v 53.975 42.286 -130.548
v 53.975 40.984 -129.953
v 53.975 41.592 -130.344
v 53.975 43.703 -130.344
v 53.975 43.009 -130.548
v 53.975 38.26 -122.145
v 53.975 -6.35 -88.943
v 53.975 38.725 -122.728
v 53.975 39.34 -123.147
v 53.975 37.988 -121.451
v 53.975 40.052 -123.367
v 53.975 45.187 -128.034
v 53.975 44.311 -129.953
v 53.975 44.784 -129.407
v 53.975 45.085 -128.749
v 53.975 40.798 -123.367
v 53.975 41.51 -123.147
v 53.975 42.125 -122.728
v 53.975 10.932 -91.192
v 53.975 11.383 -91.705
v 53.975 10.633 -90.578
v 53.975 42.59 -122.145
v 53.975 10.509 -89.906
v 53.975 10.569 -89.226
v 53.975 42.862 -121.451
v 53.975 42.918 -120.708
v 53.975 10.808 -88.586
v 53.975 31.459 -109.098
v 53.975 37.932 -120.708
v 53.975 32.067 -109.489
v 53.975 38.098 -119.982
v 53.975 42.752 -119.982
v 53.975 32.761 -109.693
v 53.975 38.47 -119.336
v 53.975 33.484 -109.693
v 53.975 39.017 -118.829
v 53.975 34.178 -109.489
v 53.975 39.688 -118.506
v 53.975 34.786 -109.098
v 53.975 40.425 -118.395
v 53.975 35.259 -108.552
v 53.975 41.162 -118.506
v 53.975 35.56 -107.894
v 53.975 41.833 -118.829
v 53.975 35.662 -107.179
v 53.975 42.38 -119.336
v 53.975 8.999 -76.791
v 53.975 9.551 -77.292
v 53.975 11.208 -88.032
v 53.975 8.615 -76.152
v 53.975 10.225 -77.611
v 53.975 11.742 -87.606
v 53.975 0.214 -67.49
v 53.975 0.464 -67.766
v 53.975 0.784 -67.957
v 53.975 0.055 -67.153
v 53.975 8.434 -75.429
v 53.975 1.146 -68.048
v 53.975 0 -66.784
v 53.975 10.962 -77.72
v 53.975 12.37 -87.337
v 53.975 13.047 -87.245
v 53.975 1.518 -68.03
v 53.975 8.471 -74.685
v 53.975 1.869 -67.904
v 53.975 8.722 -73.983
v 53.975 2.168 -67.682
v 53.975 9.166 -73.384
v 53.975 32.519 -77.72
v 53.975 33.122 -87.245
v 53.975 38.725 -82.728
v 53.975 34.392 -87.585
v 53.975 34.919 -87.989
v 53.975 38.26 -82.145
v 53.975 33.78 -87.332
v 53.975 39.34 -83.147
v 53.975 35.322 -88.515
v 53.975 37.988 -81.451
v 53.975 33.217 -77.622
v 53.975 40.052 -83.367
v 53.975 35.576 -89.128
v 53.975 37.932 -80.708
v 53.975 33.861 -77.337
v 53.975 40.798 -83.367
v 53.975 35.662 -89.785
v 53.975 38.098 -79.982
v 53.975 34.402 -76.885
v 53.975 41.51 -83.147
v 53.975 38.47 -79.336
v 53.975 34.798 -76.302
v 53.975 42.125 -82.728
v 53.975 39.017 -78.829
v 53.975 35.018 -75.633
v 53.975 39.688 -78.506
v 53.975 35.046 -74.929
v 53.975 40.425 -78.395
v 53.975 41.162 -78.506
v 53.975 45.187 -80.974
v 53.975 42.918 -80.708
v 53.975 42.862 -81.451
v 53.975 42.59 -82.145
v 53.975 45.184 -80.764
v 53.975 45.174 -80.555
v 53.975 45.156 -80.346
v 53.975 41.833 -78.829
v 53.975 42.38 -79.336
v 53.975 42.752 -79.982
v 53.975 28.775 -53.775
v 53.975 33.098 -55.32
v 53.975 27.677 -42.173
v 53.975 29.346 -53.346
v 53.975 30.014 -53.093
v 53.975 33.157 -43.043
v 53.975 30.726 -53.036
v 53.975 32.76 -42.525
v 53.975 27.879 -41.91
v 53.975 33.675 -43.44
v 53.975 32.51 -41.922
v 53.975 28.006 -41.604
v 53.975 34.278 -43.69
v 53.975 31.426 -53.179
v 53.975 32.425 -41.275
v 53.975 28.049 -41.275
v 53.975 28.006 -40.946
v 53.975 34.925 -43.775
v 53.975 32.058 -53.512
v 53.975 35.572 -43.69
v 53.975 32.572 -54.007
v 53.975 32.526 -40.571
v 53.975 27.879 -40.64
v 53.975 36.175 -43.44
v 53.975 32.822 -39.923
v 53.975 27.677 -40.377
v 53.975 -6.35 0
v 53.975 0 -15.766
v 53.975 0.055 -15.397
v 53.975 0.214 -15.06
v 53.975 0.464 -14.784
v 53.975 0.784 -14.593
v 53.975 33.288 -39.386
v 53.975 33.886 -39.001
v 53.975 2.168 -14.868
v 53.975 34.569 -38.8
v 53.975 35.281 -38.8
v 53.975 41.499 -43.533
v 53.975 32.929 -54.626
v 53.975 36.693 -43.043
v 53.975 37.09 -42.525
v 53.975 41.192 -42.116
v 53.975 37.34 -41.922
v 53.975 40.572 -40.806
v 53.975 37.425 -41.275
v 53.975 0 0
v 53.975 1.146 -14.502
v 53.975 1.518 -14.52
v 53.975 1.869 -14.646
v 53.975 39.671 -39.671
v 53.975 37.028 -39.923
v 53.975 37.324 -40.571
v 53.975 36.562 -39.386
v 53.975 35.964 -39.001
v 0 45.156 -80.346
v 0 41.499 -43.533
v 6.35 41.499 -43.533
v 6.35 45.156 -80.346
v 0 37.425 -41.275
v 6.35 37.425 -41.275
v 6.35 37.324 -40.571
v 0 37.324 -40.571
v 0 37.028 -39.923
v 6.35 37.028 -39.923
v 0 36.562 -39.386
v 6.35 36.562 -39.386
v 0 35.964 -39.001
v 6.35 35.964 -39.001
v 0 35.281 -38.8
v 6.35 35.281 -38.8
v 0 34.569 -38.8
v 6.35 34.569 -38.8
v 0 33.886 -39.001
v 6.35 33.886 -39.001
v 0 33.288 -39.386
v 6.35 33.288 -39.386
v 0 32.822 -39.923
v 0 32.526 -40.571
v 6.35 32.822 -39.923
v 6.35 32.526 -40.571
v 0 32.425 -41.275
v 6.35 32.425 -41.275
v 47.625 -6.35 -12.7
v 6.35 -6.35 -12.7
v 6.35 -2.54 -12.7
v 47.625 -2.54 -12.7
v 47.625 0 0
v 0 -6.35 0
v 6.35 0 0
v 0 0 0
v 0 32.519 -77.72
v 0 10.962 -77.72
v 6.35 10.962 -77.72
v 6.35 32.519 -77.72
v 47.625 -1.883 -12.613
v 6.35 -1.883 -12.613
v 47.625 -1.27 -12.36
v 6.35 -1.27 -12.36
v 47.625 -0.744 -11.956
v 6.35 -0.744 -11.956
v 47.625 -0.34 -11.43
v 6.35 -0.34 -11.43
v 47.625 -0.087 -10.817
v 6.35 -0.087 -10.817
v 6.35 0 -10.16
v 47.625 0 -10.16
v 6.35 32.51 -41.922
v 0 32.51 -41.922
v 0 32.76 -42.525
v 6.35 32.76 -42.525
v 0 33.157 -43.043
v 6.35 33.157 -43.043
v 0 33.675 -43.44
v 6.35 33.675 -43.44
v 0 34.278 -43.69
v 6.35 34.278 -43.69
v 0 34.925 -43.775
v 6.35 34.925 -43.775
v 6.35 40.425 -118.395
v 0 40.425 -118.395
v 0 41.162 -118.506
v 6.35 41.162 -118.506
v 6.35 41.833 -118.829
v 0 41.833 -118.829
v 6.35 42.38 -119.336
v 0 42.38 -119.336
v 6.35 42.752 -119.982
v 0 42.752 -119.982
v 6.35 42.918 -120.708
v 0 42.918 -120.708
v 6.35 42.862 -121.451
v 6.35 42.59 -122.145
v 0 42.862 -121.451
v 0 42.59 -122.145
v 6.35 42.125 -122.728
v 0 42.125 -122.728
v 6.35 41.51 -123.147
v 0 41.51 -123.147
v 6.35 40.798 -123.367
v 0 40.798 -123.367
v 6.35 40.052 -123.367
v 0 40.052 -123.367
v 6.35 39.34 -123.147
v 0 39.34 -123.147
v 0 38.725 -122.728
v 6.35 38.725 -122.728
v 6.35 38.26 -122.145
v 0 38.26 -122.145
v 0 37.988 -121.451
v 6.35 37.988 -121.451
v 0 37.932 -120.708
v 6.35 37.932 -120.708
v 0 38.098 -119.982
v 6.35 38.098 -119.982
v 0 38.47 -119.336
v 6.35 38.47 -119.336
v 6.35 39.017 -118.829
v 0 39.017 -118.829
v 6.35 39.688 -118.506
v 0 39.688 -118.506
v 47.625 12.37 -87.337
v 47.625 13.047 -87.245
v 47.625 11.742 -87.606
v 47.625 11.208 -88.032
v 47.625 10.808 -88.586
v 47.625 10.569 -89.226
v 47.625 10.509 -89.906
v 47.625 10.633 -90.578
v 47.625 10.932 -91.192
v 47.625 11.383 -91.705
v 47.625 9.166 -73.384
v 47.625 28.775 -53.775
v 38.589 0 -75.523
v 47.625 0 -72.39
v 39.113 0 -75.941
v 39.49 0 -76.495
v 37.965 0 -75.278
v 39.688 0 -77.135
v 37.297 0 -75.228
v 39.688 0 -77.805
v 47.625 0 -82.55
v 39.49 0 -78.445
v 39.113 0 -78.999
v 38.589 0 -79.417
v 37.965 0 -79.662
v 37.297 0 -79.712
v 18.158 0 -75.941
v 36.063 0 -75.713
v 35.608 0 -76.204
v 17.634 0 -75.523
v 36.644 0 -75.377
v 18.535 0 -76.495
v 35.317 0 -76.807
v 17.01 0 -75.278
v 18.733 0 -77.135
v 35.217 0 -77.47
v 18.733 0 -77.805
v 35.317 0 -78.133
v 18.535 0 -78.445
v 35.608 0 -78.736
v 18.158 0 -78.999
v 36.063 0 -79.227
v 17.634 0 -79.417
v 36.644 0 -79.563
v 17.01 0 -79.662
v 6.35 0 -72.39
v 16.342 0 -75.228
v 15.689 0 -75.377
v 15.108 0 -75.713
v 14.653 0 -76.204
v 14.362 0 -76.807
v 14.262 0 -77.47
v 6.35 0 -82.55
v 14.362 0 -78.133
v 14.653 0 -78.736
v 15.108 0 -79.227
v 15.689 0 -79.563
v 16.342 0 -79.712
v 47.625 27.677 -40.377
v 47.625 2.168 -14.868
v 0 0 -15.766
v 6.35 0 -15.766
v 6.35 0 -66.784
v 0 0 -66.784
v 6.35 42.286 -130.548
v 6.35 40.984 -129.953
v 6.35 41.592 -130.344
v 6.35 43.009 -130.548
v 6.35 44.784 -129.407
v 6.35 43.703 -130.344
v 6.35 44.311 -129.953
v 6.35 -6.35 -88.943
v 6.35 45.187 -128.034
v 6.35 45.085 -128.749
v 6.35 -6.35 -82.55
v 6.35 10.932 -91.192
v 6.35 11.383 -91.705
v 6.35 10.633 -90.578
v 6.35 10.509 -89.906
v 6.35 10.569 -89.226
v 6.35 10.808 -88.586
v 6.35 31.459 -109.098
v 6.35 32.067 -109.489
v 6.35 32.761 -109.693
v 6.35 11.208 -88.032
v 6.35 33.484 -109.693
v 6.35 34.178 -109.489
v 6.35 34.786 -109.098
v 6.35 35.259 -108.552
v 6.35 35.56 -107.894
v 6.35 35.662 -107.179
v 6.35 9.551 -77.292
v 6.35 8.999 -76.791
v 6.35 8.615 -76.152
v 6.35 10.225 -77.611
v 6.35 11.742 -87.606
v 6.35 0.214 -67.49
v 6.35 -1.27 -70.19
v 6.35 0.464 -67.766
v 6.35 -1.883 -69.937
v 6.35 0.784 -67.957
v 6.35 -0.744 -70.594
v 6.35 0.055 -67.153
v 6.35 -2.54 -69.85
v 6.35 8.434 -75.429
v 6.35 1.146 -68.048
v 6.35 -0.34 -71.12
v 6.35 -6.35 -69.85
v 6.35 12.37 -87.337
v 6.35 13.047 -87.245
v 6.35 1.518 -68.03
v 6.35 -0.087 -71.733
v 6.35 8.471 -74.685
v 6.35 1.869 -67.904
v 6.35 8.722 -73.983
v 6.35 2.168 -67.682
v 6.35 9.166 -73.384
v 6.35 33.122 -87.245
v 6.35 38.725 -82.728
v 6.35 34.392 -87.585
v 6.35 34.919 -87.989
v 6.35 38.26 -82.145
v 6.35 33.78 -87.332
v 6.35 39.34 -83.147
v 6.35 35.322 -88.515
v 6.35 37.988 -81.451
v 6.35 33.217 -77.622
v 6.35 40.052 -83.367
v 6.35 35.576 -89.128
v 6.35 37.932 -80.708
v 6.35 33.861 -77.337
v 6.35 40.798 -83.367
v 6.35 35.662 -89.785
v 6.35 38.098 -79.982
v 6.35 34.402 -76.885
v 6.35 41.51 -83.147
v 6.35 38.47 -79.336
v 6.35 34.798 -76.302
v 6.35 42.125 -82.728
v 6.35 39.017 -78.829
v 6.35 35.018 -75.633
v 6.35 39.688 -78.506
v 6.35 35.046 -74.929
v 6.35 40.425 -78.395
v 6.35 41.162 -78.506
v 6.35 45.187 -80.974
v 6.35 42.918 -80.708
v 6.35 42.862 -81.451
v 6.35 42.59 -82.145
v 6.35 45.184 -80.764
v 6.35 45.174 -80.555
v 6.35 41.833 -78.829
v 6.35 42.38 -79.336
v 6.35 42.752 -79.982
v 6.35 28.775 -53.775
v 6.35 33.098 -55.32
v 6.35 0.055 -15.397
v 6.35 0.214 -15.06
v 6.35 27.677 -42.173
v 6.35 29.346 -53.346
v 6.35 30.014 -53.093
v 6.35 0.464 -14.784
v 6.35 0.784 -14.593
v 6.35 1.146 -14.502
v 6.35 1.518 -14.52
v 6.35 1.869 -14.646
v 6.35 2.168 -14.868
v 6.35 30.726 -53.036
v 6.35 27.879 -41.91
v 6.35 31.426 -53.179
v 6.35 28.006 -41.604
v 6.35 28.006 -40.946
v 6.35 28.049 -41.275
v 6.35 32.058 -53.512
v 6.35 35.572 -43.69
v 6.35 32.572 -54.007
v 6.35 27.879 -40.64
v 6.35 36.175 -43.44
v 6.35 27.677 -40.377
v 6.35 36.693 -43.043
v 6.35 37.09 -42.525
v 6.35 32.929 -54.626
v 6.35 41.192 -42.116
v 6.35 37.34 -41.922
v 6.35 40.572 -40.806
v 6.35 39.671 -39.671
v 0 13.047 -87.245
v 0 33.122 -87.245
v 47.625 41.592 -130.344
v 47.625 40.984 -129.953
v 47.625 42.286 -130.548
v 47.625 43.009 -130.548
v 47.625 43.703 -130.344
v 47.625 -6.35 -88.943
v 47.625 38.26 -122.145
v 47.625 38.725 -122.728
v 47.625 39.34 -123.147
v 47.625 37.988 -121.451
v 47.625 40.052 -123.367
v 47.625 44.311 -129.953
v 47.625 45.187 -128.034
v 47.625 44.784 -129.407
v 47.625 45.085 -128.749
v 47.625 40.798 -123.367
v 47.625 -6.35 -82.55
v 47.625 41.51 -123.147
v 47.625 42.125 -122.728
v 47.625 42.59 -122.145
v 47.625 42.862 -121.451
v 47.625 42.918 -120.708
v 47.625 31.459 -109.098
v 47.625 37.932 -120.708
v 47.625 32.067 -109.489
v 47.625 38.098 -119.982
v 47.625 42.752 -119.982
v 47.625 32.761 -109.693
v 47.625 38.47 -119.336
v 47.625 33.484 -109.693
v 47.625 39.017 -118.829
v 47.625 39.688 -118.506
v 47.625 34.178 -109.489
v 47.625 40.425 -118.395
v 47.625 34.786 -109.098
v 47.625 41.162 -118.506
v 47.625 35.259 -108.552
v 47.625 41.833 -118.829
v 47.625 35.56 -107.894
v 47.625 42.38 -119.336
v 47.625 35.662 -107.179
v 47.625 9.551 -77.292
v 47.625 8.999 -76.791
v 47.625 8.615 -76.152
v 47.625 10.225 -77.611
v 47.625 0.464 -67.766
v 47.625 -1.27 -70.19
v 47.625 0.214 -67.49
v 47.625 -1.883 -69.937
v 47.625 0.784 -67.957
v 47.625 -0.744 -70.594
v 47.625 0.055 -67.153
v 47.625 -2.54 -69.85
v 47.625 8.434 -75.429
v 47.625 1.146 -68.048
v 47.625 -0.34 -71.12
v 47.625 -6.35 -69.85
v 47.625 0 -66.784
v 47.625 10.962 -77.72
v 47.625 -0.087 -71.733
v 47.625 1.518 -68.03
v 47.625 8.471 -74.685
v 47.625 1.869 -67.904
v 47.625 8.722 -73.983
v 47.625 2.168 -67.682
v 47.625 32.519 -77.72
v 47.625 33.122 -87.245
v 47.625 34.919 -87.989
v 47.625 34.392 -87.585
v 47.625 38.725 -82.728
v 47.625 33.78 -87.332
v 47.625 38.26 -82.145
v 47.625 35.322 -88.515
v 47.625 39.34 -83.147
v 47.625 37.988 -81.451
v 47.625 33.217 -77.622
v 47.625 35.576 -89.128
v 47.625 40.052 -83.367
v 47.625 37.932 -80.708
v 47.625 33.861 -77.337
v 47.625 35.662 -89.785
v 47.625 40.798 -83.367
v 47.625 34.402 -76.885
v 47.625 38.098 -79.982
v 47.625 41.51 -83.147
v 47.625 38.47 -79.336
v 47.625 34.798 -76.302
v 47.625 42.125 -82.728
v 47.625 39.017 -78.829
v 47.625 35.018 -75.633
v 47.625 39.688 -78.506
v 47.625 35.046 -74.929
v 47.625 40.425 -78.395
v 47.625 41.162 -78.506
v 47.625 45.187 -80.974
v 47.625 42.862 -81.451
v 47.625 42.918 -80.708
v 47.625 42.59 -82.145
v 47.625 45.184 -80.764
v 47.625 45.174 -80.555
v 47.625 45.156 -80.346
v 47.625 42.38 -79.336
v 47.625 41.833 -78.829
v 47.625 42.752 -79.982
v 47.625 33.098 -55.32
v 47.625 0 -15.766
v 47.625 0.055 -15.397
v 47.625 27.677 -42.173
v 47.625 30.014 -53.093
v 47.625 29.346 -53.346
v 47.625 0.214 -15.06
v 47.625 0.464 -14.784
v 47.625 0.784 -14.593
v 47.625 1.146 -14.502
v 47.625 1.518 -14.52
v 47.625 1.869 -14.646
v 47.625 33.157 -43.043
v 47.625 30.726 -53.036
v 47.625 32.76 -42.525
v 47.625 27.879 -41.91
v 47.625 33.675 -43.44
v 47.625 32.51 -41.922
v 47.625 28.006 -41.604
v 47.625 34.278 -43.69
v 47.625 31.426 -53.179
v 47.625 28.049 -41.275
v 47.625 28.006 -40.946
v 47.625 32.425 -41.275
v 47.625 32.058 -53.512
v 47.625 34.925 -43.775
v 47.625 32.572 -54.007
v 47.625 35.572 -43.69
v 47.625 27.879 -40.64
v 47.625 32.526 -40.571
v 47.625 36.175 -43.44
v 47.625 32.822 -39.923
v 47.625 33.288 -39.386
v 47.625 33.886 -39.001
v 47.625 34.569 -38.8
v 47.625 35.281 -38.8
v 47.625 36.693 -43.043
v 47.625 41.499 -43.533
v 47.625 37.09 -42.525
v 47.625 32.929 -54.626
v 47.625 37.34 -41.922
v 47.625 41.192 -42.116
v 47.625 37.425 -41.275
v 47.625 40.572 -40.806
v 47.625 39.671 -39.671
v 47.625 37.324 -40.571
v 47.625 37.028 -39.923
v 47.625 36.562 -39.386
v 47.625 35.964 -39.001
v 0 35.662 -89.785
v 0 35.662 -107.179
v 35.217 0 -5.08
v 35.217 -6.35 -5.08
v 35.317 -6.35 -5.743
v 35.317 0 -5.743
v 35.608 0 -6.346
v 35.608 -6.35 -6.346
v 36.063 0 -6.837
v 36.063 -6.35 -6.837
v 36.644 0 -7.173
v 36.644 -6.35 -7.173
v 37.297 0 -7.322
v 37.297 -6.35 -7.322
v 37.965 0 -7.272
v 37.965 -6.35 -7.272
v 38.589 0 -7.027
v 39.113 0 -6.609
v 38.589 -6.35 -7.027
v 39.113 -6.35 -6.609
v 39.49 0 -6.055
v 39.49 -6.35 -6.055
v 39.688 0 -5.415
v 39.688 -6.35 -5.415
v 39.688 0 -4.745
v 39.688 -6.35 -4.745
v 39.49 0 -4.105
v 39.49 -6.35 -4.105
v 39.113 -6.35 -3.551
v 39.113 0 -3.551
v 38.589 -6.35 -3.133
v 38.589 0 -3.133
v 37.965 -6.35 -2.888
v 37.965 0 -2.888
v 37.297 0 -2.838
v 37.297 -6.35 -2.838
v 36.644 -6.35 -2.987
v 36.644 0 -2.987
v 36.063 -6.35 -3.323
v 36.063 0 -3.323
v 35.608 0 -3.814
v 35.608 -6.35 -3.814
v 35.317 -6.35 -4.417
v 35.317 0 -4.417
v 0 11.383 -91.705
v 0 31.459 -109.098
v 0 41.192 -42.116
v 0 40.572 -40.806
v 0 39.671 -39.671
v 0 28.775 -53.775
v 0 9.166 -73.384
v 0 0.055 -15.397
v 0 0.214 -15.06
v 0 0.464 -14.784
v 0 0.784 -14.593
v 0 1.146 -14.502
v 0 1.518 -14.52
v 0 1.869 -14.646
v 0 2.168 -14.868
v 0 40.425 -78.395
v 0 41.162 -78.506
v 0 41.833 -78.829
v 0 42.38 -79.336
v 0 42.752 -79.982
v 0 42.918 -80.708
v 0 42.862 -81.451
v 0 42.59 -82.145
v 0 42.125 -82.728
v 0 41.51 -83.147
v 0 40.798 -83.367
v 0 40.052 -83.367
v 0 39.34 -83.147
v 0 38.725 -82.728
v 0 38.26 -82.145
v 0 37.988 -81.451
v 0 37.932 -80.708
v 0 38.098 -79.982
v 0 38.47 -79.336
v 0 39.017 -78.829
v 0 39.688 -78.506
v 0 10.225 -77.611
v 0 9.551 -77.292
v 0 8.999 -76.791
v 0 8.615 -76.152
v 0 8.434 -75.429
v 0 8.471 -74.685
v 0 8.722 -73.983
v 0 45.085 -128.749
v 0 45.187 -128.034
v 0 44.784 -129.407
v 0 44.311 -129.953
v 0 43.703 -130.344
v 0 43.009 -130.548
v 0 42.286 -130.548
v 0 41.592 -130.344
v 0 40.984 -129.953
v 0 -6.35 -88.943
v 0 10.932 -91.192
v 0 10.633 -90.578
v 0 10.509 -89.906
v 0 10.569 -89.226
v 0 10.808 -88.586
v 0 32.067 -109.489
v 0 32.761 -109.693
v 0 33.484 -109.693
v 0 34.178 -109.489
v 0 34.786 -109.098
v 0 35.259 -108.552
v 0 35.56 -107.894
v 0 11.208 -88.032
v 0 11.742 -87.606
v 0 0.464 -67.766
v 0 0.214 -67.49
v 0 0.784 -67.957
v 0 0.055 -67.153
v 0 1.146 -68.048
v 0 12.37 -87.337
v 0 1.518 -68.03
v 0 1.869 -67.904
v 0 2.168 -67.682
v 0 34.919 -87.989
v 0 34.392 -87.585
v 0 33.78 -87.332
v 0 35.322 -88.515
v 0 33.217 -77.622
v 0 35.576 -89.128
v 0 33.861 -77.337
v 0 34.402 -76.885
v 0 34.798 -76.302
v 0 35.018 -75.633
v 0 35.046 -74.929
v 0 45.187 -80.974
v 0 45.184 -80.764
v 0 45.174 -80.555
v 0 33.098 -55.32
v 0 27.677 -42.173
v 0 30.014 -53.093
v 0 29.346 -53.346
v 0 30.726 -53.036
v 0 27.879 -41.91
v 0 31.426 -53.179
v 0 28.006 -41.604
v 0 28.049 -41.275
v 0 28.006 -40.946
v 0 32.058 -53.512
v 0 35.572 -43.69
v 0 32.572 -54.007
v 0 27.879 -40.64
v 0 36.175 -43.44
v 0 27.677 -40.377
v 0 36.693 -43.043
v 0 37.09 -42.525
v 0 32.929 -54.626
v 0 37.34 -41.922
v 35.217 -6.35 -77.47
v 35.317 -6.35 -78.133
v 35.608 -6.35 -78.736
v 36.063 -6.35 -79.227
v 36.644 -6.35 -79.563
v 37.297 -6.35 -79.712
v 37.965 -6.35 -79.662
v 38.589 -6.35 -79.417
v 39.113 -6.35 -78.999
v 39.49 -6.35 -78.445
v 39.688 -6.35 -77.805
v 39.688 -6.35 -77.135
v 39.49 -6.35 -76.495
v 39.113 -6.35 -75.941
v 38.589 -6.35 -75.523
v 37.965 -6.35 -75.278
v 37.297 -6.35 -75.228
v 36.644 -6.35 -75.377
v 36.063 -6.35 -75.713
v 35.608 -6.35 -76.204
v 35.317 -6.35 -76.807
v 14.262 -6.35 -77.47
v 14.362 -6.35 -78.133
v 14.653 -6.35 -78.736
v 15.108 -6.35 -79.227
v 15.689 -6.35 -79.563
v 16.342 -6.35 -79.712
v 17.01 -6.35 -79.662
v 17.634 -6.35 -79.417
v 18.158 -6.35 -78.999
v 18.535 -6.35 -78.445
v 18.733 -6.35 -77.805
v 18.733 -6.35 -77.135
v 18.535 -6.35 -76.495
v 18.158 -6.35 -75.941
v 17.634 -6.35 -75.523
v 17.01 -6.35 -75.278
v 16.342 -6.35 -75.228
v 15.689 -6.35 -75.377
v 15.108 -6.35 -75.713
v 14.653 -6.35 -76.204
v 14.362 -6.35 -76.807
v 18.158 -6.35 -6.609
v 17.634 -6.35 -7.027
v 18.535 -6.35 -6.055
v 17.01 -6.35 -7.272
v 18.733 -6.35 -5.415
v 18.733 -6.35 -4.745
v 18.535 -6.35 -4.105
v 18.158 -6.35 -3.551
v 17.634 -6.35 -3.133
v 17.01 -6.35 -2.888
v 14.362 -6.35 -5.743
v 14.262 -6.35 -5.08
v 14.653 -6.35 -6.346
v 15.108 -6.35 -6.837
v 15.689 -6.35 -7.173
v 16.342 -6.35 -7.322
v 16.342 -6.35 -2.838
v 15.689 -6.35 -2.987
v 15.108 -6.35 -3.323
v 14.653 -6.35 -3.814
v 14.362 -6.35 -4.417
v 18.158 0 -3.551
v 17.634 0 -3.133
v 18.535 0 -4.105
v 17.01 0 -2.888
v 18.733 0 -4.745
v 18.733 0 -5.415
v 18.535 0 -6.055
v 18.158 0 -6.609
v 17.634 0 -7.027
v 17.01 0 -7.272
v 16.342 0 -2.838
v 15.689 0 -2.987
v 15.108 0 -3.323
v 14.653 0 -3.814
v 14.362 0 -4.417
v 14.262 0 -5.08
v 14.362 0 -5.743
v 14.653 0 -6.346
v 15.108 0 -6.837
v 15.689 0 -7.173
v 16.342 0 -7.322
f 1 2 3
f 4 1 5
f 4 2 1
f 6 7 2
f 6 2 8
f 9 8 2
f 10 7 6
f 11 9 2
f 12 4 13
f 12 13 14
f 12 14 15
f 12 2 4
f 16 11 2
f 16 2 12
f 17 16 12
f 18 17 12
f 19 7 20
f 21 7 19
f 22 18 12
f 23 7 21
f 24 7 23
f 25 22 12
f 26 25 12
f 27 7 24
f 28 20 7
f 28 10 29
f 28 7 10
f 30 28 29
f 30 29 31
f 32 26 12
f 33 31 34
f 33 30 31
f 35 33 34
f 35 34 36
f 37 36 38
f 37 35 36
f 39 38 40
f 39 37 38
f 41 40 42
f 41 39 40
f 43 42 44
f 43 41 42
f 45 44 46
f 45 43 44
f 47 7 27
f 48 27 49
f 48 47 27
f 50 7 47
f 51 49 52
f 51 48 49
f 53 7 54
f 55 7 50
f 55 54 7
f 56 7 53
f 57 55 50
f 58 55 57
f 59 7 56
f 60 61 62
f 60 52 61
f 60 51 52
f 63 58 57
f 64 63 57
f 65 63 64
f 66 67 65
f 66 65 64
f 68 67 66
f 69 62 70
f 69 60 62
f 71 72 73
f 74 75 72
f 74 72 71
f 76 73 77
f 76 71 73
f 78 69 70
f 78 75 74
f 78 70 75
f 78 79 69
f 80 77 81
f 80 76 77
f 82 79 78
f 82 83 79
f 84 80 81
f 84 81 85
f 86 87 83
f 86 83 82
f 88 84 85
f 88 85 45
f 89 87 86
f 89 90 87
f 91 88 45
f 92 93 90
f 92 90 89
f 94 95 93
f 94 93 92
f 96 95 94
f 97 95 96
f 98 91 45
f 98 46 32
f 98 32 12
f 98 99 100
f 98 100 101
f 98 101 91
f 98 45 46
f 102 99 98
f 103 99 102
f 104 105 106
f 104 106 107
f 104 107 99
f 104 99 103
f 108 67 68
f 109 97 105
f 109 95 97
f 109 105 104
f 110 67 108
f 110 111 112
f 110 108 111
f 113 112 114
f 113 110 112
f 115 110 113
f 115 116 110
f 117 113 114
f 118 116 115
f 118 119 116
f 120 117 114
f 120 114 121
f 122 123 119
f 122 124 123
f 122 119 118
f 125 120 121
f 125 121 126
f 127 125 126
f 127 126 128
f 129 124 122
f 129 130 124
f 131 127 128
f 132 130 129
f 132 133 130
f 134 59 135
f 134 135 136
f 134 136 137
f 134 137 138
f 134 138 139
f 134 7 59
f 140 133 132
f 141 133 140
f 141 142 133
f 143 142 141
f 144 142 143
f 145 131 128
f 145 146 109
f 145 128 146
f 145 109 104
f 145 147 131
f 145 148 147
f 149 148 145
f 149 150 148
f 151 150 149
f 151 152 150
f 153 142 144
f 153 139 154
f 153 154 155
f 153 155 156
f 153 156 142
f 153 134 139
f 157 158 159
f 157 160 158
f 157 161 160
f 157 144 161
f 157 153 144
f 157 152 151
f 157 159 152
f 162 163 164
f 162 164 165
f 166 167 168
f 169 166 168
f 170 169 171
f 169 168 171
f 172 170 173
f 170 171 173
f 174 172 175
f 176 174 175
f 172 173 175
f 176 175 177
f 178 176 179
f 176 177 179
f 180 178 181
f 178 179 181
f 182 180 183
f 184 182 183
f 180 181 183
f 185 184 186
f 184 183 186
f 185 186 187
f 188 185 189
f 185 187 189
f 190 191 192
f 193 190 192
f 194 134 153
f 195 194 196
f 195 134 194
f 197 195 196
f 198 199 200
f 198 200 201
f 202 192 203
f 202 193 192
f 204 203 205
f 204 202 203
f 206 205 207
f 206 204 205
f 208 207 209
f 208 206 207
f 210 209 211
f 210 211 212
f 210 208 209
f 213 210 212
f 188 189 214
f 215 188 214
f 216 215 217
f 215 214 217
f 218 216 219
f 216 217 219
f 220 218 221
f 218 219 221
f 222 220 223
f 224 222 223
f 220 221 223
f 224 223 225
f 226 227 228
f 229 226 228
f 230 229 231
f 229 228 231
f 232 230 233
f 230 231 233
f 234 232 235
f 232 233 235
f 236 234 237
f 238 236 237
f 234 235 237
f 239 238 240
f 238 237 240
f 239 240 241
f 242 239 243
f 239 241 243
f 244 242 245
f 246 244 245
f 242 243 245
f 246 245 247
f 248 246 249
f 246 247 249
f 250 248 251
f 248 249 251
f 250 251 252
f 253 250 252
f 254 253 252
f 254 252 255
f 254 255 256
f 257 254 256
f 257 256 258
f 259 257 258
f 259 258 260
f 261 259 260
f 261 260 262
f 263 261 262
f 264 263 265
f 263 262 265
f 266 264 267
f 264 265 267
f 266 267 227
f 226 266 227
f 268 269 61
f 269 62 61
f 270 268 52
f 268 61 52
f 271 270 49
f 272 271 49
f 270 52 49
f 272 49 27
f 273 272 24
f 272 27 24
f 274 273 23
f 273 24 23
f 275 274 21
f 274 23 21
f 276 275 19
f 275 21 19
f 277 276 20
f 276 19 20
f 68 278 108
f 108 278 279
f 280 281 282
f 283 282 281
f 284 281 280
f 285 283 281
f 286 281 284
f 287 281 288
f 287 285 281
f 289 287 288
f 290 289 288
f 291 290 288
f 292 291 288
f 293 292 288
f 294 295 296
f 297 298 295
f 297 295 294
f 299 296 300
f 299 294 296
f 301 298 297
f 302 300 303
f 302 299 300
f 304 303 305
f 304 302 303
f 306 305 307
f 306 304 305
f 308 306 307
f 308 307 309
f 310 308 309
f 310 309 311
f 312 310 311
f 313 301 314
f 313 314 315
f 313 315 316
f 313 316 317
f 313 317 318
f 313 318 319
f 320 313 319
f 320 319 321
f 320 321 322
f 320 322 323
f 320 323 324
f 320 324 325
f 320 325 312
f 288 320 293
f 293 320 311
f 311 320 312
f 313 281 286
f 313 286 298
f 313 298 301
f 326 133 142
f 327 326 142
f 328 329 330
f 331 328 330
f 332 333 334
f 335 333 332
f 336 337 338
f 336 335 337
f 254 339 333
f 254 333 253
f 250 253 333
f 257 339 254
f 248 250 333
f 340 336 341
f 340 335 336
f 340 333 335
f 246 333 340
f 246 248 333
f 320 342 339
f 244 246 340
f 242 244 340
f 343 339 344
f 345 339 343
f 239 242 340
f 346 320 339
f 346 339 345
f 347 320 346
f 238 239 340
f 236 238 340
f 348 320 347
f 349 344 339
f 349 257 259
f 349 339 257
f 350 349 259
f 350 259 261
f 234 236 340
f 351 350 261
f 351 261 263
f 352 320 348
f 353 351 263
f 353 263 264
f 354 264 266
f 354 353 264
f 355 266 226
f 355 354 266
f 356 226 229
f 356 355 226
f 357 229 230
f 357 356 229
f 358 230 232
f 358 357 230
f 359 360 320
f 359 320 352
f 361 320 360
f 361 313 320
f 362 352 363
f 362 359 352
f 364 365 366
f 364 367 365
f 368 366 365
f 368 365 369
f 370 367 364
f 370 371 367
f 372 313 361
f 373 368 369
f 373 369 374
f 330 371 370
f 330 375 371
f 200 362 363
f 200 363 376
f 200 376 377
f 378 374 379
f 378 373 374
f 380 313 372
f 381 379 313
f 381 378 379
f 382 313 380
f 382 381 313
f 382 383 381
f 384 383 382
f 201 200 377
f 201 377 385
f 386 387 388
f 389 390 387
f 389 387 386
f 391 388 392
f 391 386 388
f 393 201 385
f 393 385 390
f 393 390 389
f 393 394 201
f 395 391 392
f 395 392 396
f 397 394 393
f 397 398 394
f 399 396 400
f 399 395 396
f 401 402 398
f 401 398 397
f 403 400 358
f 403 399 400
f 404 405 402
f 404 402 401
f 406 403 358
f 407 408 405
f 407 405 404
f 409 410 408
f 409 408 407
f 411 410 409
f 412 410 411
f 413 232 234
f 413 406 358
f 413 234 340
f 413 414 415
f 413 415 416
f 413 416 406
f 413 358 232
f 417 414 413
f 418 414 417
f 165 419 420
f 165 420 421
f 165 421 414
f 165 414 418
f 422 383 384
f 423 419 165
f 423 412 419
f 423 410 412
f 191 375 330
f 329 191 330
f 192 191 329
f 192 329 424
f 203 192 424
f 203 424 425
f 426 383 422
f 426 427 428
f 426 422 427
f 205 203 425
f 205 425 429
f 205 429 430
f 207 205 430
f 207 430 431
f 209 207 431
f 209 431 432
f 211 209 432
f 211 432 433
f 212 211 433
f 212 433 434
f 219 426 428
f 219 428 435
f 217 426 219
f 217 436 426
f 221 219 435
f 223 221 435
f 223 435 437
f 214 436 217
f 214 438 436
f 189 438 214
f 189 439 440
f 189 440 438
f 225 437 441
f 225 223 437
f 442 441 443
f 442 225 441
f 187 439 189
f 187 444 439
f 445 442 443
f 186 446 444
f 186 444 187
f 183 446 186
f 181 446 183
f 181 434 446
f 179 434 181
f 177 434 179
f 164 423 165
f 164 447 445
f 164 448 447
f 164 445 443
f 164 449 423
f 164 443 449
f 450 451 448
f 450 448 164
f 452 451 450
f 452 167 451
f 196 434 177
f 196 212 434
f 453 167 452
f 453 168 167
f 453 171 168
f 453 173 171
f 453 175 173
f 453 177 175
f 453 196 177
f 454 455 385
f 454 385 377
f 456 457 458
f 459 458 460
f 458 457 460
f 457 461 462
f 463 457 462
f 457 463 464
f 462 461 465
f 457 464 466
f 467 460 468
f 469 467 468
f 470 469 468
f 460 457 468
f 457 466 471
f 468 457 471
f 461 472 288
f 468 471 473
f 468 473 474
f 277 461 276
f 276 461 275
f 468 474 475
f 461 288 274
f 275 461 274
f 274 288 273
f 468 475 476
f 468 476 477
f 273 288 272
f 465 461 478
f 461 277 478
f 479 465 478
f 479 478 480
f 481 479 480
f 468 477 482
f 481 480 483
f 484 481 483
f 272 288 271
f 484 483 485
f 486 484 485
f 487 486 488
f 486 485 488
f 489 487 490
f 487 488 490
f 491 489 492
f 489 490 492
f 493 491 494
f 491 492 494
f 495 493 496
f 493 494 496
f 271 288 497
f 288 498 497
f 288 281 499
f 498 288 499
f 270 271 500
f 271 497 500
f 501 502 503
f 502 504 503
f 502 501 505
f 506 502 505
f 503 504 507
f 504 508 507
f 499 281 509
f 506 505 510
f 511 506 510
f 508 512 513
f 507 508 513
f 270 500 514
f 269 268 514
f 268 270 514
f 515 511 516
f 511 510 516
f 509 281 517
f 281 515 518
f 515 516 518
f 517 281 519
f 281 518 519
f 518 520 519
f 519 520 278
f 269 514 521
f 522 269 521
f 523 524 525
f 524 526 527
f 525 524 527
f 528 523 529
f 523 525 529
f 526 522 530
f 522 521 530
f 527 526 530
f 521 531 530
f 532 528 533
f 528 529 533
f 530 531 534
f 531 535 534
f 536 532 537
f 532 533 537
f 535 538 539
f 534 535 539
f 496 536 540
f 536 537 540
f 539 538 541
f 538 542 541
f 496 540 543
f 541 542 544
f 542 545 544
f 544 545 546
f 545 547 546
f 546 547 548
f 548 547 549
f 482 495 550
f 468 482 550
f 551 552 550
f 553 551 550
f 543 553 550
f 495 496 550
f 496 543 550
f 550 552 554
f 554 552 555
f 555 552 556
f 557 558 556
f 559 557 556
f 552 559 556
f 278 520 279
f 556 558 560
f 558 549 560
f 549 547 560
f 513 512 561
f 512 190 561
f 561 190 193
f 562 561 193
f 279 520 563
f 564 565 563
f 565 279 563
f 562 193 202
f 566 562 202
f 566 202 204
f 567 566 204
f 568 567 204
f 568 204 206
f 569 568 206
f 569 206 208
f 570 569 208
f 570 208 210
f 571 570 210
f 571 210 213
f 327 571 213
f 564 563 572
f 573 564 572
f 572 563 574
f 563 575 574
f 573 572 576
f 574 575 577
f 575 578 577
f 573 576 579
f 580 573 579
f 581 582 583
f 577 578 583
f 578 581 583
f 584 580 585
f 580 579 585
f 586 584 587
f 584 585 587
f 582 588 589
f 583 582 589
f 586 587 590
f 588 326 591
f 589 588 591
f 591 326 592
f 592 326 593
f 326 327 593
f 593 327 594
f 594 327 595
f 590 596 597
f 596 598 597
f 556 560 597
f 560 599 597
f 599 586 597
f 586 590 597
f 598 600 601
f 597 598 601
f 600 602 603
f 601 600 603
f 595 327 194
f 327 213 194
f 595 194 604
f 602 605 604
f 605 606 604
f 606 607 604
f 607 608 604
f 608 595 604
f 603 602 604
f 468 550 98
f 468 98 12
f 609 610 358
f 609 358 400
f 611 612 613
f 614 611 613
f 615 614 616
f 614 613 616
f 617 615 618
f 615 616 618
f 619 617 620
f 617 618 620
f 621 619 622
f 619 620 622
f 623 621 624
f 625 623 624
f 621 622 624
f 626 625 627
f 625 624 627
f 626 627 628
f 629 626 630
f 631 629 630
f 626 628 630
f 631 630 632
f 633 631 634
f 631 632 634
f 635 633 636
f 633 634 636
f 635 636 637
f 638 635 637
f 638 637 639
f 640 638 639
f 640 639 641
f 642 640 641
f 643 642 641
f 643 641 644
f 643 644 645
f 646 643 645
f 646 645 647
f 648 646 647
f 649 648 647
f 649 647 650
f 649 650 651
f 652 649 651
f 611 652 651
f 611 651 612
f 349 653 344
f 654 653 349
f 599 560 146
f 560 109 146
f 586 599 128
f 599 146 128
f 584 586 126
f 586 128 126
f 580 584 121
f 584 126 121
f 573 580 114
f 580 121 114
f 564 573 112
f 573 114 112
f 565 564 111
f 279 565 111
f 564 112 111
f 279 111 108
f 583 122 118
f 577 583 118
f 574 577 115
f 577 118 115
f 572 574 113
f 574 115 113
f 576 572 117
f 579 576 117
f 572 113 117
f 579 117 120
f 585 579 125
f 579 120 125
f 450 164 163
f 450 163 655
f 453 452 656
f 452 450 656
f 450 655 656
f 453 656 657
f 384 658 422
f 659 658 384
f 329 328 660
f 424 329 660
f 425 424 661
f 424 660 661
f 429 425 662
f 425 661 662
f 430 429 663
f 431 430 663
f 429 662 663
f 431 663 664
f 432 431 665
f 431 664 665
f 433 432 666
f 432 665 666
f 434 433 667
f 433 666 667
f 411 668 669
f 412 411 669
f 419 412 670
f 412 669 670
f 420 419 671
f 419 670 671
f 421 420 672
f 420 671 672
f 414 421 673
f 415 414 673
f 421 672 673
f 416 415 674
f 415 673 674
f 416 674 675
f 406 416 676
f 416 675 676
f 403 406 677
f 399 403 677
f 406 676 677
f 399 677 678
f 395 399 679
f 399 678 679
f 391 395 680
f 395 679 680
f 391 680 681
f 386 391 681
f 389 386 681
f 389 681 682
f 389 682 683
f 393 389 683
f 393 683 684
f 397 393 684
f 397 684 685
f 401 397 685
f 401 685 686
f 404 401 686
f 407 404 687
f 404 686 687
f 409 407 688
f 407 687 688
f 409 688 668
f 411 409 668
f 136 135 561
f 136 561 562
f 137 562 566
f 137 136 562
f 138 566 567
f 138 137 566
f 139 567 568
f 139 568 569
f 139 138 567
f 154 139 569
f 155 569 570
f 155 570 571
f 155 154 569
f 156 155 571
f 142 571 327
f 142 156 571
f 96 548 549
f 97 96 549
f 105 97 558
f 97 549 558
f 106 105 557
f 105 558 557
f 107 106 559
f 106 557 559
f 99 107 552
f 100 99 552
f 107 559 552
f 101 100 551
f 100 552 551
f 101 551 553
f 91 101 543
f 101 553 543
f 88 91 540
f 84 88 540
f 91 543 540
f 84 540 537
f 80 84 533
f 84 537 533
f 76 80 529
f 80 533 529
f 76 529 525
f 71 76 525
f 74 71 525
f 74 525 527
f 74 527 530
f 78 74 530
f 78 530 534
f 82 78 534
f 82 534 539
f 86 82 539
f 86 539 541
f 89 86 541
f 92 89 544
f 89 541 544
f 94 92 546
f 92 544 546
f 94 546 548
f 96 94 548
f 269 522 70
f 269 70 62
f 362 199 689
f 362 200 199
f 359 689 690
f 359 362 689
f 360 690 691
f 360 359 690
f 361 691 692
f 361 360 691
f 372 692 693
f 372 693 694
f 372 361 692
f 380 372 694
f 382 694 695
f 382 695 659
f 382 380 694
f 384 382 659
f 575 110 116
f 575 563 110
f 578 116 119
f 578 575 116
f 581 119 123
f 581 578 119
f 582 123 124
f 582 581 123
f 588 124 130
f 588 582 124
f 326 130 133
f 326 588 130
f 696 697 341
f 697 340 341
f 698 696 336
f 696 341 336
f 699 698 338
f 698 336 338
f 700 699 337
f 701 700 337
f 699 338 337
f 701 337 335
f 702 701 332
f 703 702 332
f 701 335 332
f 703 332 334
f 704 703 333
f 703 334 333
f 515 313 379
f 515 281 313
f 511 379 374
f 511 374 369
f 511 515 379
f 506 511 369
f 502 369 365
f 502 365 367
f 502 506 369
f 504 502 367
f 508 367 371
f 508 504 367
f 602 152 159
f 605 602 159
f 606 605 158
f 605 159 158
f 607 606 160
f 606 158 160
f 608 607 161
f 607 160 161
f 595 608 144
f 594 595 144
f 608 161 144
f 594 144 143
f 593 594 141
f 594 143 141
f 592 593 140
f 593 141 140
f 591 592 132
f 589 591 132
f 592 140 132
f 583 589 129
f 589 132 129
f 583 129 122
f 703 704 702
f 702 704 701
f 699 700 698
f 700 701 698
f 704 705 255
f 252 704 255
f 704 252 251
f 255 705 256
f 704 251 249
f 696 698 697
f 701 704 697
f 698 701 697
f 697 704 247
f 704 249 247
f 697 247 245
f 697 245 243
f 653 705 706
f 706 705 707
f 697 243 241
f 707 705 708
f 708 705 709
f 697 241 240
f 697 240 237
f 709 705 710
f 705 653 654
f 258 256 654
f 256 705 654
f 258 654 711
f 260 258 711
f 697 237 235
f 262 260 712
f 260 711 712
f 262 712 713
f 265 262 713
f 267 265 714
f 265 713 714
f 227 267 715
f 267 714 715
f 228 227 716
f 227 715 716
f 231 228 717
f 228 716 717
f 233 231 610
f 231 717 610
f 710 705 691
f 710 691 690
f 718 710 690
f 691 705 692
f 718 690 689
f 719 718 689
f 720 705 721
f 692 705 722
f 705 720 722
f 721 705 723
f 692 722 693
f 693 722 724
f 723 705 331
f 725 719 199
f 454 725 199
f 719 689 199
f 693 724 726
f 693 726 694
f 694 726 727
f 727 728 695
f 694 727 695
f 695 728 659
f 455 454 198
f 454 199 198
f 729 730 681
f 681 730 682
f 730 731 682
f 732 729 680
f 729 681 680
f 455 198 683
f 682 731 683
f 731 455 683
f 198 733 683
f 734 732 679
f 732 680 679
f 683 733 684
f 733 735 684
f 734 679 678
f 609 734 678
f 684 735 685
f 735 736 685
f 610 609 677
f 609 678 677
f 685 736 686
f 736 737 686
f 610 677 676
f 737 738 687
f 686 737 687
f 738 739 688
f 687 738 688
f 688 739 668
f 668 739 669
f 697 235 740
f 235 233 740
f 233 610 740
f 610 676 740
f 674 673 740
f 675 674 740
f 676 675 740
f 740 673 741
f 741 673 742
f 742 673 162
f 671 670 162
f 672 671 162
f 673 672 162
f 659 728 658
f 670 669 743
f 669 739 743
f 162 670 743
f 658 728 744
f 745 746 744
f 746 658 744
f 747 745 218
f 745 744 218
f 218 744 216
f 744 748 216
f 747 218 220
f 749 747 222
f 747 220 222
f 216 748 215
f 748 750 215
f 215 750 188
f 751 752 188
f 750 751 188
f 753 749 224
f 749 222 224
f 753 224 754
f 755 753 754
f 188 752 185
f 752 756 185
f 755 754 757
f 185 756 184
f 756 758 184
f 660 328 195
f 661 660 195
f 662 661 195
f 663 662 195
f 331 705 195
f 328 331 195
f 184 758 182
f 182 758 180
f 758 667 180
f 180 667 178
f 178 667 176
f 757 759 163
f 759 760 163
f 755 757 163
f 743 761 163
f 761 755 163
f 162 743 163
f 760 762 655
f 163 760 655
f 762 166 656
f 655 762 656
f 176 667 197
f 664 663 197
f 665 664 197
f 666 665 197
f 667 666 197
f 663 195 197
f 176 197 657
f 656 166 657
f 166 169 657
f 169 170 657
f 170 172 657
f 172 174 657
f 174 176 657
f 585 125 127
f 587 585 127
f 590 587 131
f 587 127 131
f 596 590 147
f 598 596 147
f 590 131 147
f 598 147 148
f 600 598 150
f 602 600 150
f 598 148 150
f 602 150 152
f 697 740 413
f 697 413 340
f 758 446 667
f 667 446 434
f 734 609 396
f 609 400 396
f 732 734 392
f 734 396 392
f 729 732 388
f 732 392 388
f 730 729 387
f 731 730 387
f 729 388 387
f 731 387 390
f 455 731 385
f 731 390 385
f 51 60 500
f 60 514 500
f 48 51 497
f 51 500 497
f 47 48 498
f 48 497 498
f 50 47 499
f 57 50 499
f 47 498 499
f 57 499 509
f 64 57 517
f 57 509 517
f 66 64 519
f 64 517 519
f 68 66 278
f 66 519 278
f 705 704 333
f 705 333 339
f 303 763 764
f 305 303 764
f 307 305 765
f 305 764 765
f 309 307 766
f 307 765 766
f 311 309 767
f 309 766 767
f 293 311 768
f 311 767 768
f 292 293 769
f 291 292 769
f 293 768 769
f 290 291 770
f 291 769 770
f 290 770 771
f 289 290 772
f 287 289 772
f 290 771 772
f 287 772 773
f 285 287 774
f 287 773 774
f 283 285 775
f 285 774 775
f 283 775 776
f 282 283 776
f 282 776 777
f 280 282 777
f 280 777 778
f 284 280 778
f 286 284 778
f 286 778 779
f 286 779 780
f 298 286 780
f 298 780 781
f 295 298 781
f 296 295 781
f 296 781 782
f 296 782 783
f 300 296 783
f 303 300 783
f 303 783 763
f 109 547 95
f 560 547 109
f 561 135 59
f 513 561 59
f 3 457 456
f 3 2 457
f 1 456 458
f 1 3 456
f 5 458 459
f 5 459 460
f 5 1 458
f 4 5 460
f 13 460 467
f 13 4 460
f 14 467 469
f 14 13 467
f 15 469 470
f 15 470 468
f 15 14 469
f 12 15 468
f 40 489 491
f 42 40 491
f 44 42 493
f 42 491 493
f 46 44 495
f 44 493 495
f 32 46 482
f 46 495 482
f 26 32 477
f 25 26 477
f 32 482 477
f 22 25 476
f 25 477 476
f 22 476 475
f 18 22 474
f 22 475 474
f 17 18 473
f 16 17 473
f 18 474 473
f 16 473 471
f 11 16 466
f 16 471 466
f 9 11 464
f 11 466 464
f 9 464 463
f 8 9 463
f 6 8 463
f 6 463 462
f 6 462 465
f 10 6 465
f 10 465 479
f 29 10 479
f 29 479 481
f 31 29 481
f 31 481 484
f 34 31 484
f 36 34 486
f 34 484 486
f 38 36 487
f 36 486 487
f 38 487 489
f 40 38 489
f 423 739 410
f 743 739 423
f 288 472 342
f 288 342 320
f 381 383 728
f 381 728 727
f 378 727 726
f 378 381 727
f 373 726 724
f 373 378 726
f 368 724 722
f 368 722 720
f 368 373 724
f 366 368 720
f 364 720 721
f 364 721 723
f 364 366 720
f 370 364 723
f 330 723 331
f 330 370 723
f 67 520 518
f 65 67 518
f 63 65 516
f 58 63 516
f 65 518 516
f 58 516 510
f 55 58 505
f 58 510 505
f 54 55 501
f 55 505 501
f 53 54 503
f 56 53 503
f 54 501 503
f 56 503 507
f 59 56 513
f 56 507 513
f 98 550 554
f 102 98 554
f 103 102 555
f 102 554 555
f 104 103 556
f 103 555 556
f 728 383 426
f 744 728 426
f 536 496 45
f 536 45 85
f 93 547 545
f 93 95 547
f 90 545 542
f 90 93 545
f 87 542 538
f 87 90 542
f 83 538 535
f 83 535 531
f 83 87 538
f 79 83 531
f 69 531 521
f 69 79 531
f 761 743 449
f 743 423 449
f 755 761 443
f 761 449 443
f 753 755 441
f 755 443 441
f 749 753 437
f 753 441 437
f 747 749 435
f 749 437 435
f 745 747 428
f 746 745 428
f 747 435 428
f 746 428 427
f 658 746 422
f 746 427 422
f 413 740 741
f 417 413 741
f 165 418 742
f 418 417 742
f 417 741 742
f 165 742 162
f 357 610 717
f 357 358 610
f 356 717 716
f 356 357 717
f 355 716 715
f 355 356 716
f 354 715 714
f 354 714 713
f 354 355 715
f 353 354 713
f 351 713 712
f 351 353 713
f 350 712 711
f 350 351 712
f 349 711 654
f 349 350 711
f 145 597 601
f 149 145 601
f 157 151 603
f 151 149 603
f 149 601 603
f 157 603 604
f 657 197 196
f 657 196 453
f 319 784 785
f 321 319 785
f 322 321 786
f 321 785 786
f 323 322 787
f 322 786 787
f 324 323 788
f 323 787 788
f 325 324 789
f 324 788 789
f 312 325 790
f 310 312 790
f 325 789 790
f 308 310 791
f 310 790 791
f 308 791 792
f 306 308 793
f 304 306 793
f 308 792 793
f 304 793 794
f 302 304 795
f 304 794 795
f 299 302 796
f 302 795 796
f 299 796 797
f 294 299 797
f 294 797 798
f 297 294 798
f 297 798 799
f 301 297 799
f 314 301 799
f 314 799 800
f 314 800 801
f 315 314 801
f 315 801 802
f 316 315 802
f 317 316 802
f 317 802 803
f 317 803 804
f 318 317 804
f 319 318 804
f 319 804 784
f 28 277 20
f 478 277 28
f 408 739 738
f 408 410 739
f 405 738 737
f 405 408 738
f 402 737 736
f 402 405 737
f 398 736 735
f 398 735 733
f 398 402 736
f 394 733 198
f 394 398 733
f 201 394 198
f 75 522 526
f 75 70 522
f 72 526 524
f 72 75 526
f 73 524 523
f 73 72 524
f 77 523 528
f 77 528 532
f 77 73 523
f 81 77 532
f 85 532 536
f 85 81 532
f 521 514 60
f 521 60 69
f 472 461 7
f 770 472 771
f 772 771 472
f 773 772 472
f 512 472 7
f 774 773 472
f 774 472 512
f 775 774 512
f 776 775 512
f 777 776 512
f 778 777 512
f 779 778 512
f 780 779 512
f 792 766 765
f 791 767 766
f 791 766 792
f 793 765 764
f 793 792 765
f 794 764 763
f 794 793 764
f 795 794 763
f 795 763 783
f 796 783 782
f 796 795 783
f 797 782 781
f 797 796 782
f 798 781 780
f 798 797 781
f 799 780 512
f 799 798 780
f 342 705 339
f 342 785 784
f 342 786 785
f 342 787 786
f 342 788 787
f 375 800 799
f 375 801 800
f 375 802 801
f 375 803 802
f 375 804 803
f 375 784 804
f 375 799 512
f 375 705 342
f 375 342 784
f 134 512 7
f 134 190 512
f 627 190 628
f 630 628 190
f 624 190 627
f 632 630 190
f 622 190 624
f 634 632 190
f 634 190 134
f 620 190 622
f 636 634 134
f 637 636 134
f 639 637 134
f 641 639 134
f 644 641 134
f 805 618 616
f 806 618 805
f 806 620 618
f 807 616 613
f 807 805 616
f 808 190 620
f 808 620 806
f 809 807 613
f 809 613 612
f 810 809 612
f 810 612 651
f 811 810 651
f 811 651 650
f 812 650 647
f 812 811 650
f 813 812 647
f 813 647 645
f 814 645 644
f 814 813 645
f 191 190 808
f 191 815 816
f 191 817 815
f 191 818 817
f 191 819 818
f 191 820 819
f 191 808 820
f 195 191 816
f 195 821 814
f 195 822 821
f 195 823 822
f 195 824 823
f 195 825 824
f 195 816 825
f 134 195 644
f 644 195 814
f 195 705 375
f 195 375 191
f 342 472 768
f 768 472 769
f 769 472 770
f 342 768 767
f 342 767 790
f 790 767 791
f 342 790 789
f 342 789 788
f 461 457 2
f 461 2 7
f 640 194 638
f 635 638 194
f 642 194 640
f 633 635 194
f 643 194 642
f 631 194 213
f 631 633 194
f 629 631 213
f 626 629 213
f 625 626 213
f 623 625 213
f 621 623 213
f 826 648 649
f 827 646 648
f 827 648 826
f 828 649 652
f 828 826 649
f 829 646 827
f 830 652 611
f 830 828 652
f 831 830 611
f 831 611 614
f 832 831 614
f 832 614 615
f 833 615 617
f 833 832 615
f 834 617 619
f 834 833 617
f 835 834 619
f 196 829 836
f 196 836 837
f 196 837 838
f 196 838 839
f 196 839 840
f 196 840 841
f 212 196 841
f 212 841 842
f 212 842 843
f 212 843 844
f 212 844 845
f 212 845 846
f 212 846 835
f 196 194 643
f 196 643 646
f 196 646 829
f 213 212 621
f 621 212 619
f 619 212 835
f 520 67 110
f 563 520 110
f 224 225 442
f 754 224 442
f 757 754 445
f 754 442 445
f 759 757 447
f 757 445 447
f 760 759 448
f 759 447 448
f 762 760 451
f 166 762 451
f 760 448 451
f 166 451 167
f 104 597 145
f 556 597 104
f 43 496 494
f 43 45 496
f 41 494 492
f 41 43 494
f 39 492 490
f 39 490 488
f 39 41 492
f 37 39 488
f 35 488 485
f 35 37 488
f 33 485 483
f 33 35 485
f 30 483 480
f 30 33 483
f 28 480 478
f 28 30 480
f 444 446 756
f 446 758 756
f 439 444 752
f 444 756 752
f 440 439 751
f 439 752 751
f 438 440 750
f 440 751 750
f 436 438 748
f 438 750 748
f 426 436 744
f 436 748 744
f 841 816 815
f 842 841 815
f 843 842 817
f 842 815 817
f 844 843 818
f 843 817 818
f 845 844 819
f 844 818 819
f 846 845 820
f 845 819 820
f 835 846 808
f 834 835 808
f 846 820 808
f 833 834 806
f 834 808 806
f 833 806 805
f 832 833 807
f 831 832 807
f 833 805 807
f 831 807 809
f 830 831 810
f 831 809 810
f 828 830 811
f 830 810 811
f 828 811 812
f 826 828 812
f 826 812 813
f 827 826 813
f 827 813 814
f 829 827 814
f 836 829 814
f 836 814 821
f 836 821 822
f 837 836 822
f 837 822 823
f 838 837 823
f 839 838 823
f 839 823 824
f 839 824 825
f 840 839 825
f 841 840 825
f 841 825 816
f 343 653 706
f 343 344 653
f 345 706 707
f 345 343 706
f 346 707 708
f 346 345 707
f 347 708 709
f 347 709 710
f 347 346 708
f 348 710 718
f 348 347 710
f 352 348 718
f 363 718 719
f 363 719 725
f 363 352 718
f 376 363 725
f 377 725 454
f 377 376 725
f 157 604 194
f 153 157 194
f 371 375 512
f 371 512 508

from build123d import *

# Parameters (mm, degrees)
BOSS_EXTRUDE3_DEPTH   = 6.35
SKETCH13_W            = 12.7
SKETCH13_H            = 6.35
BOSS_EXTRUDE4_DEPTH   = 41.275
SKETCH14_W            = 12.7
SKETCH14_H            = 6.35
SKETCH14_W_2          = 69.85
BOSS_EXTRUDE5_DEPTH   = 6.35
CUT_EXTRUDE4_DEPTH    = 107.917859827
CUT_EXTRUDE5_DEPTH    = 107.917859827
SKETCH26_R            = 2.5
BOSS_EXTRUDE6_DEPTH   = 6.35
BOSS_EXTRUDE7_START   = -47.625
SKETCH26_2_R          = 2.5
BOSS_EXTRUDE7_DEPTH   = 6.35
FILLET17_R            = 1.27
FILLET18_R            = 1.27
FILLET19_R            = 1.27
FILLET20_START        = 47.625
FILLET20_DEPTH        = 6.35
FILLET21_R            = 1.27
FILLET22_DEPTH        = 6.35
FILLET29_R            = 2.54
F_8_CLEARANCE_HOLE1_D = 4.4958
FILLET30_R            = 6.35
FILLET31_R            = 2.54


with BuildPart() as part:
    # Sketch4 → Boss-Extrude3 (new body)
    with BuildSketch(Plane(origin=(0, 0, 0), x_dir=(0, 0, -1), z_dir=(1, 0, 0))):
        Polygon((0, 0), (41.275, 41.275), (82.55, 0), (82.55, -6.35), (0, -6.35), align=None)
    extrude(amount=BOSS_EXTRUDE3_DEPTH)

    # Sketch13 → Boss-Extrude4 (add)
    with BuildSketch(Plane(origin=(6.35, 0, 0), x_dir=(0, 0, -1), z_dir=(1, 0, 0))):
        with Locations((6.35, -3.175)):
            Rectangle(SKETCH13_W, SKETCH13_H)
        with Locations((76.2, -3.175)):
            Rectangle(SKETCH13_W, SKETCH13_H)
    extrude(amount=BOSS_EXTRUDE4_DEPTH)

    # Sketch14 → Boss-Extrude5 (add)
    with BuildSketch(Plane(origin=(47.625, 0, 0), x_dir=(0, 0, -1), z_dir=(1, 0, 0))):
        Polygon((41.275, 41.275), (0, 0), (12.7, 0), (82.55, 0), align=None)
        with Locations((6.35, -3.175)):
            Rectangle(SKETCH14_W, SKETCH14_H)
        with Locations((47.625, -3.175)):
            Rectangle(SKETCH14_W_2, SKETCH14_H)
    extrude(amount=BOSS_EXTRUDE5_DEPTH)

    # Sketch20 → Cut-Extrude4 (cut, through all)
    with BuildSketch(Plane(origin=(53.975, 0, 0), x_dir=(0, 0, -1), z_dir=(1, 0, 0))):
        Polygon((41.275, 28.575), (12.7, 0), (69.85, 0), align=None)
    extrude(amount=-CUT_EXTRUDE4_DEPTH, mode=Mode.SUBTRACT)

    # Sketch21 → Cut-Extrude5 (cut, through all)
    with BuildSketch(Plane(origin=(53.975, 0, 0), x_dir=(0, 0, -1), z_dir=(1, 0, 0))):
        with BuildLine():
            ThreePointArc((43.775, 34.925), (43.042766953, 36.692766953), (41.275, 37.425))
            Line((41.275, 37.425), (41.275, 32.425))
            ThreePointArc((41.275, 32.425), (43.042766953, 33.157233047), (43.775, 34.925))
        make_face()
        with BuildLine():
            Line((41.275, 32.425), (41.275, 37.425))
            ThreePointArc((41.275, 37.425), (38.775, 34.925), (41.275, 32.425))
        make_face()
    extrude(amount=-CUT_EXTRUDE5_DEPTH, mode=Mode.SUBTRACT)

    # Sketch26 → Boss-Extrude6 (add)
    with BuildSketch(Plane.ZY):
        Polygon((-41.275, 41.275), (-80.659092999, 45.187499922), (-133.595070682, 45.187499922), (-88.943397116, -6.35), (-77.720070682, -6.35), (-77.720070682, 35.323646113), (-49.981920931, 32.568079069), align=None)
        with Locations((-80.895070682, 40.424999922)):
            Circle(SKETCH26_R, mode=Mode.SUBTRACT)
        with Locations((-120.895070682, 40.424999922)):
            Circle(SKETCH26_R, mode=Mode.SUBTRACT)
        Polygon((-87.245070682, 35.662499922), (-87.245070682, 6.23593212), (-112.740011292, 35.662499922), align=None, mode=Mode.SUBTRACT)
    extrude(amount=-BOSS_EXTRUDE6_DEPTH)

    # Sketch26<2> → Boss-Extrude7 (add)
    with BuildSketch(Plane.ZY.offset(BOSS_EXTRUDE7_START)):
        Polygon((-41.275, 41.275), (-80.659092999, 45.187499922), (-133.595070682, 45.187499922), (-88.943397116, -6.35), (-77.720070682, -6.35), (-77.720070682, 35.323646113), (-49.981920931, 32.568079069), align=None)
        with Locations((-80.895070682, 40.424999922)):
            Circle(SKETCH26_2_R, mode=Mode.SUBTRACT)
        with Locations((-120.895070682, 40.424999922)):
            Circle(SKETCH26_2_R, mode=Mode.SUBTRACT)
        Polygon((-87.245070682, 35.662499922), (-87.245070682, 6.23593212), (-112.740011292, 35.662499922), align=None, mode=Mode.SUBTRACT)
    extrude(amount=-BOSS_EXTRUDE7_DEPTH)

    # Fillet17
    fillet17_edges = [part.edges().sort_by_distance(p)[0] for p in [
        (3.175, 28.575, -41.275),
    ]]
    fillet(fillet17_edges, radius=FILLET17_R)

    # Fillet18
    fillet18_edges = [part.edges().sort_by_distance(p)[0] for p in [
        (50.8, 28.575, -41.275),
    ]]
    fillet(fillet18_edges, radius=FILLET18_R)

    # Fillet19
    # the kernel refuses this fillet: 1.27 mm, written as the material it adds along each edge
    with BuildSketch(Plane(origin=(53.975, 0, -12.7), x_dir=(0, 0.7071067811865481, -0.7071067811865469), z_dir=(-1, 0, 0))) as fillet19_piece_1:
        with BuildLine():
            CenterArc((FILLET19_R * 2.41421356237, FILLET19_R), FILLET19_R, 135, 135)
            Line((FILLET19_R * 1.70710678119, FILLET19_R * 1.70710678119), (0, 0))
            Line((0, 0), (FILLET19_R * 2.41421356237, 0))
        make_face()
    extrude(amount=6.35)

    # Fillet20: read off the stored shape, not the designer's step
    # Fillet20 outline → Fillet20 (add)
    with BuildSketch(Plane.YZ.offset(FILLET20_START)):
        with BuildLine():
            Line((0, -69.85), (2.168025612, -67.681974388))
            ThreePointArc((2.168025612, -67.681974388), (0.783992041, -67.957275782), (0, -66.783948776))
            Line((0, -66.783948776), (0, -69.85))
        make_face()
    extrude(amount=FILLET20_DEPTH)

    # Fillet21
    # the kernel refuses this fillet: 1.27 mm, written as the material it adds along each edge
    with BuildSketch(Plane(origin=(6.35, 0, -69.85), x_dir=(0, 0, 1), z_dir=(-1, 0, 0))) as fillet21_piece_1:
        with BuildLine():
            CenterArc((FILLET21_R * 2.41421356237, FILLET21_R), FILLET21_R, 135, 135)
            Line((FILLET21_R * 1.70710678119, FILLET21_R * 1.70710678119), (0, 0))
            Line((0, 0), (FILLET21_R * 2.41421356237, 0))
        make_face()
    extrude(amount=6.35)

    # Fillet22: read off the stored shape, not the designer's step
    # Fillet22 outline → Fillet22 (add)
    with BuildSketch(Plane.YZ):
        with BuildLine():
            ThreePointArc((0, -15.766051224), (0.783992041, -14.592724218), (2.168025612, -14.868025612))
            Line((2.168025612, -14.868025612), (0, -12.7))
            Line((0, -12.7), (0, -15.766051224))
        make_face()
    extrude(amount=FILLET22_DEPTH)

    # Fillet29
    fillet29_edges = [part.edges().sort_by_distance(p)[0] for p in [
        (26.9875, 0, -12.7),
        (26.9875, 0, -69.85),
    ]]
    fillet(fillet29_edges, radius=FILLET29_R)

    # #8 Clearance Hole1 (through all)
    with Locations(Plane(origin=(0, 0, 0), x_dir=(1, 0, 0), z_dir=(0, 1, 0))):
        with Locations((16.51, 77.47), (37.465, 77.47), (37.465, 5.08), (16.51, 5.08)):
            Hole(F_8_CLEARANCE_HOLE1_D / 2)

    # Fillet30
    # the kernel refuses this fillet: 6.35 mm, written as the material it takes off along each edge
    with BuildSketch(Plane(origin=(-0.786592277, 45.187499922, -80.659092999), x_dir=(0, -0.0988555378398254, 0.995101795113645), z_dir=(1, 0, 0))) as fillet30_piece_1:
        with BuildLine():
            CenterArc((FILLET30_R * 0.0495491197902, FILLET30_R), FILLET30_R, 264.326728924, 5.673271076)
            Line((-FILLET30_R * 0.0493064180496, FILLET30_R * 0.00489820488635), (0, 0))
            Line((0, 0), (FILLET30_R * 0.0495491197903, 0))
        make_face()
    extrude(amount=7.923184553, mode=Mode.SUBTRACT)
    with BuildSketch(Plane(origin=(46.838407723, 45.187499922, -80.659092999), x_dir=(0, 0, -1), z_dir=(1, 0, 0))) as fillet30_piece_2:
        with BuildLine():
            CenterArc((FILLET30_R * 0.0495491197903, -FILLET30_R), FILLET30_R, 90, 5.673271076)
            Line((-FILLET30_R * 0.0493064180496, -FILLET30_R * 0.00489820488636), (0, 0))
            Line((0, 0), (FILLET30_R * 0.0495491197903, 0))
        make_face()
    extrude(amount=7.923184553, mode=Mode.SUBTRACT)
    with BuildSketch(Plane(origin=(41.952376432, 41.275, -41.275), x_dir=(0, -0.7071067811865476, 0.7071067811865476), z_dir=(1, 0, 0)), Plane(origin=(-5.672623568, 41.275, -41.275), x_dir=(0, -0.7071067811865459, 0.707106781186549), z_dir=(1, 0, 0))) as fillet30_piece_3:
        with BuildLine():
            CenterArc((FILLET30_R * 0.357330618477, FILLET30_R), FILLET30_R, 230.673271076, 39.326728924)
            Line((-FILLET30_R * 0.276411187654, FILLET30_R * 0.22645535154), (0, 0))
            Line((0, 0), (FILLET30_R * 0.357330618477, 0))
        make_face()
    extrude(amount=17.695247137, mode=Mode.SUBTRACT)

    # Fillet31
    fillet31_edges = [part.edges().sort_by_distance(p)[0] for p in [
        (3.175, 35.323646113, -77.720070682),
        (3.175, 32.568079069, -49.981920931),
        (3.175, 4.829929318, -77.720070682),
        (3.175, 45.187499922, -133.595070682),
        (3.175, 35.662499922, -87.245070682),
        (3.175, 6.23593212, -87.245070682),
        (3.175, 35.662499922, -112.740011292),
        (50.8, 4.829929318, -77.720070682),
        (50.8, 35.323646113, -77.720070682),
        (50.8, 32.568079069, -49.981920931),
        (50.8, 45.187499922, -133.595070682),
        (50.8, 35.662499922, -87.245070682),
        (50.8, 35.662499922, -112.740011292),
        (50.8, 6.23593212, -87.245070682),
    ]]
    fillet(fillet31_edges, radius=FILLET31_R)


solid = part.part
